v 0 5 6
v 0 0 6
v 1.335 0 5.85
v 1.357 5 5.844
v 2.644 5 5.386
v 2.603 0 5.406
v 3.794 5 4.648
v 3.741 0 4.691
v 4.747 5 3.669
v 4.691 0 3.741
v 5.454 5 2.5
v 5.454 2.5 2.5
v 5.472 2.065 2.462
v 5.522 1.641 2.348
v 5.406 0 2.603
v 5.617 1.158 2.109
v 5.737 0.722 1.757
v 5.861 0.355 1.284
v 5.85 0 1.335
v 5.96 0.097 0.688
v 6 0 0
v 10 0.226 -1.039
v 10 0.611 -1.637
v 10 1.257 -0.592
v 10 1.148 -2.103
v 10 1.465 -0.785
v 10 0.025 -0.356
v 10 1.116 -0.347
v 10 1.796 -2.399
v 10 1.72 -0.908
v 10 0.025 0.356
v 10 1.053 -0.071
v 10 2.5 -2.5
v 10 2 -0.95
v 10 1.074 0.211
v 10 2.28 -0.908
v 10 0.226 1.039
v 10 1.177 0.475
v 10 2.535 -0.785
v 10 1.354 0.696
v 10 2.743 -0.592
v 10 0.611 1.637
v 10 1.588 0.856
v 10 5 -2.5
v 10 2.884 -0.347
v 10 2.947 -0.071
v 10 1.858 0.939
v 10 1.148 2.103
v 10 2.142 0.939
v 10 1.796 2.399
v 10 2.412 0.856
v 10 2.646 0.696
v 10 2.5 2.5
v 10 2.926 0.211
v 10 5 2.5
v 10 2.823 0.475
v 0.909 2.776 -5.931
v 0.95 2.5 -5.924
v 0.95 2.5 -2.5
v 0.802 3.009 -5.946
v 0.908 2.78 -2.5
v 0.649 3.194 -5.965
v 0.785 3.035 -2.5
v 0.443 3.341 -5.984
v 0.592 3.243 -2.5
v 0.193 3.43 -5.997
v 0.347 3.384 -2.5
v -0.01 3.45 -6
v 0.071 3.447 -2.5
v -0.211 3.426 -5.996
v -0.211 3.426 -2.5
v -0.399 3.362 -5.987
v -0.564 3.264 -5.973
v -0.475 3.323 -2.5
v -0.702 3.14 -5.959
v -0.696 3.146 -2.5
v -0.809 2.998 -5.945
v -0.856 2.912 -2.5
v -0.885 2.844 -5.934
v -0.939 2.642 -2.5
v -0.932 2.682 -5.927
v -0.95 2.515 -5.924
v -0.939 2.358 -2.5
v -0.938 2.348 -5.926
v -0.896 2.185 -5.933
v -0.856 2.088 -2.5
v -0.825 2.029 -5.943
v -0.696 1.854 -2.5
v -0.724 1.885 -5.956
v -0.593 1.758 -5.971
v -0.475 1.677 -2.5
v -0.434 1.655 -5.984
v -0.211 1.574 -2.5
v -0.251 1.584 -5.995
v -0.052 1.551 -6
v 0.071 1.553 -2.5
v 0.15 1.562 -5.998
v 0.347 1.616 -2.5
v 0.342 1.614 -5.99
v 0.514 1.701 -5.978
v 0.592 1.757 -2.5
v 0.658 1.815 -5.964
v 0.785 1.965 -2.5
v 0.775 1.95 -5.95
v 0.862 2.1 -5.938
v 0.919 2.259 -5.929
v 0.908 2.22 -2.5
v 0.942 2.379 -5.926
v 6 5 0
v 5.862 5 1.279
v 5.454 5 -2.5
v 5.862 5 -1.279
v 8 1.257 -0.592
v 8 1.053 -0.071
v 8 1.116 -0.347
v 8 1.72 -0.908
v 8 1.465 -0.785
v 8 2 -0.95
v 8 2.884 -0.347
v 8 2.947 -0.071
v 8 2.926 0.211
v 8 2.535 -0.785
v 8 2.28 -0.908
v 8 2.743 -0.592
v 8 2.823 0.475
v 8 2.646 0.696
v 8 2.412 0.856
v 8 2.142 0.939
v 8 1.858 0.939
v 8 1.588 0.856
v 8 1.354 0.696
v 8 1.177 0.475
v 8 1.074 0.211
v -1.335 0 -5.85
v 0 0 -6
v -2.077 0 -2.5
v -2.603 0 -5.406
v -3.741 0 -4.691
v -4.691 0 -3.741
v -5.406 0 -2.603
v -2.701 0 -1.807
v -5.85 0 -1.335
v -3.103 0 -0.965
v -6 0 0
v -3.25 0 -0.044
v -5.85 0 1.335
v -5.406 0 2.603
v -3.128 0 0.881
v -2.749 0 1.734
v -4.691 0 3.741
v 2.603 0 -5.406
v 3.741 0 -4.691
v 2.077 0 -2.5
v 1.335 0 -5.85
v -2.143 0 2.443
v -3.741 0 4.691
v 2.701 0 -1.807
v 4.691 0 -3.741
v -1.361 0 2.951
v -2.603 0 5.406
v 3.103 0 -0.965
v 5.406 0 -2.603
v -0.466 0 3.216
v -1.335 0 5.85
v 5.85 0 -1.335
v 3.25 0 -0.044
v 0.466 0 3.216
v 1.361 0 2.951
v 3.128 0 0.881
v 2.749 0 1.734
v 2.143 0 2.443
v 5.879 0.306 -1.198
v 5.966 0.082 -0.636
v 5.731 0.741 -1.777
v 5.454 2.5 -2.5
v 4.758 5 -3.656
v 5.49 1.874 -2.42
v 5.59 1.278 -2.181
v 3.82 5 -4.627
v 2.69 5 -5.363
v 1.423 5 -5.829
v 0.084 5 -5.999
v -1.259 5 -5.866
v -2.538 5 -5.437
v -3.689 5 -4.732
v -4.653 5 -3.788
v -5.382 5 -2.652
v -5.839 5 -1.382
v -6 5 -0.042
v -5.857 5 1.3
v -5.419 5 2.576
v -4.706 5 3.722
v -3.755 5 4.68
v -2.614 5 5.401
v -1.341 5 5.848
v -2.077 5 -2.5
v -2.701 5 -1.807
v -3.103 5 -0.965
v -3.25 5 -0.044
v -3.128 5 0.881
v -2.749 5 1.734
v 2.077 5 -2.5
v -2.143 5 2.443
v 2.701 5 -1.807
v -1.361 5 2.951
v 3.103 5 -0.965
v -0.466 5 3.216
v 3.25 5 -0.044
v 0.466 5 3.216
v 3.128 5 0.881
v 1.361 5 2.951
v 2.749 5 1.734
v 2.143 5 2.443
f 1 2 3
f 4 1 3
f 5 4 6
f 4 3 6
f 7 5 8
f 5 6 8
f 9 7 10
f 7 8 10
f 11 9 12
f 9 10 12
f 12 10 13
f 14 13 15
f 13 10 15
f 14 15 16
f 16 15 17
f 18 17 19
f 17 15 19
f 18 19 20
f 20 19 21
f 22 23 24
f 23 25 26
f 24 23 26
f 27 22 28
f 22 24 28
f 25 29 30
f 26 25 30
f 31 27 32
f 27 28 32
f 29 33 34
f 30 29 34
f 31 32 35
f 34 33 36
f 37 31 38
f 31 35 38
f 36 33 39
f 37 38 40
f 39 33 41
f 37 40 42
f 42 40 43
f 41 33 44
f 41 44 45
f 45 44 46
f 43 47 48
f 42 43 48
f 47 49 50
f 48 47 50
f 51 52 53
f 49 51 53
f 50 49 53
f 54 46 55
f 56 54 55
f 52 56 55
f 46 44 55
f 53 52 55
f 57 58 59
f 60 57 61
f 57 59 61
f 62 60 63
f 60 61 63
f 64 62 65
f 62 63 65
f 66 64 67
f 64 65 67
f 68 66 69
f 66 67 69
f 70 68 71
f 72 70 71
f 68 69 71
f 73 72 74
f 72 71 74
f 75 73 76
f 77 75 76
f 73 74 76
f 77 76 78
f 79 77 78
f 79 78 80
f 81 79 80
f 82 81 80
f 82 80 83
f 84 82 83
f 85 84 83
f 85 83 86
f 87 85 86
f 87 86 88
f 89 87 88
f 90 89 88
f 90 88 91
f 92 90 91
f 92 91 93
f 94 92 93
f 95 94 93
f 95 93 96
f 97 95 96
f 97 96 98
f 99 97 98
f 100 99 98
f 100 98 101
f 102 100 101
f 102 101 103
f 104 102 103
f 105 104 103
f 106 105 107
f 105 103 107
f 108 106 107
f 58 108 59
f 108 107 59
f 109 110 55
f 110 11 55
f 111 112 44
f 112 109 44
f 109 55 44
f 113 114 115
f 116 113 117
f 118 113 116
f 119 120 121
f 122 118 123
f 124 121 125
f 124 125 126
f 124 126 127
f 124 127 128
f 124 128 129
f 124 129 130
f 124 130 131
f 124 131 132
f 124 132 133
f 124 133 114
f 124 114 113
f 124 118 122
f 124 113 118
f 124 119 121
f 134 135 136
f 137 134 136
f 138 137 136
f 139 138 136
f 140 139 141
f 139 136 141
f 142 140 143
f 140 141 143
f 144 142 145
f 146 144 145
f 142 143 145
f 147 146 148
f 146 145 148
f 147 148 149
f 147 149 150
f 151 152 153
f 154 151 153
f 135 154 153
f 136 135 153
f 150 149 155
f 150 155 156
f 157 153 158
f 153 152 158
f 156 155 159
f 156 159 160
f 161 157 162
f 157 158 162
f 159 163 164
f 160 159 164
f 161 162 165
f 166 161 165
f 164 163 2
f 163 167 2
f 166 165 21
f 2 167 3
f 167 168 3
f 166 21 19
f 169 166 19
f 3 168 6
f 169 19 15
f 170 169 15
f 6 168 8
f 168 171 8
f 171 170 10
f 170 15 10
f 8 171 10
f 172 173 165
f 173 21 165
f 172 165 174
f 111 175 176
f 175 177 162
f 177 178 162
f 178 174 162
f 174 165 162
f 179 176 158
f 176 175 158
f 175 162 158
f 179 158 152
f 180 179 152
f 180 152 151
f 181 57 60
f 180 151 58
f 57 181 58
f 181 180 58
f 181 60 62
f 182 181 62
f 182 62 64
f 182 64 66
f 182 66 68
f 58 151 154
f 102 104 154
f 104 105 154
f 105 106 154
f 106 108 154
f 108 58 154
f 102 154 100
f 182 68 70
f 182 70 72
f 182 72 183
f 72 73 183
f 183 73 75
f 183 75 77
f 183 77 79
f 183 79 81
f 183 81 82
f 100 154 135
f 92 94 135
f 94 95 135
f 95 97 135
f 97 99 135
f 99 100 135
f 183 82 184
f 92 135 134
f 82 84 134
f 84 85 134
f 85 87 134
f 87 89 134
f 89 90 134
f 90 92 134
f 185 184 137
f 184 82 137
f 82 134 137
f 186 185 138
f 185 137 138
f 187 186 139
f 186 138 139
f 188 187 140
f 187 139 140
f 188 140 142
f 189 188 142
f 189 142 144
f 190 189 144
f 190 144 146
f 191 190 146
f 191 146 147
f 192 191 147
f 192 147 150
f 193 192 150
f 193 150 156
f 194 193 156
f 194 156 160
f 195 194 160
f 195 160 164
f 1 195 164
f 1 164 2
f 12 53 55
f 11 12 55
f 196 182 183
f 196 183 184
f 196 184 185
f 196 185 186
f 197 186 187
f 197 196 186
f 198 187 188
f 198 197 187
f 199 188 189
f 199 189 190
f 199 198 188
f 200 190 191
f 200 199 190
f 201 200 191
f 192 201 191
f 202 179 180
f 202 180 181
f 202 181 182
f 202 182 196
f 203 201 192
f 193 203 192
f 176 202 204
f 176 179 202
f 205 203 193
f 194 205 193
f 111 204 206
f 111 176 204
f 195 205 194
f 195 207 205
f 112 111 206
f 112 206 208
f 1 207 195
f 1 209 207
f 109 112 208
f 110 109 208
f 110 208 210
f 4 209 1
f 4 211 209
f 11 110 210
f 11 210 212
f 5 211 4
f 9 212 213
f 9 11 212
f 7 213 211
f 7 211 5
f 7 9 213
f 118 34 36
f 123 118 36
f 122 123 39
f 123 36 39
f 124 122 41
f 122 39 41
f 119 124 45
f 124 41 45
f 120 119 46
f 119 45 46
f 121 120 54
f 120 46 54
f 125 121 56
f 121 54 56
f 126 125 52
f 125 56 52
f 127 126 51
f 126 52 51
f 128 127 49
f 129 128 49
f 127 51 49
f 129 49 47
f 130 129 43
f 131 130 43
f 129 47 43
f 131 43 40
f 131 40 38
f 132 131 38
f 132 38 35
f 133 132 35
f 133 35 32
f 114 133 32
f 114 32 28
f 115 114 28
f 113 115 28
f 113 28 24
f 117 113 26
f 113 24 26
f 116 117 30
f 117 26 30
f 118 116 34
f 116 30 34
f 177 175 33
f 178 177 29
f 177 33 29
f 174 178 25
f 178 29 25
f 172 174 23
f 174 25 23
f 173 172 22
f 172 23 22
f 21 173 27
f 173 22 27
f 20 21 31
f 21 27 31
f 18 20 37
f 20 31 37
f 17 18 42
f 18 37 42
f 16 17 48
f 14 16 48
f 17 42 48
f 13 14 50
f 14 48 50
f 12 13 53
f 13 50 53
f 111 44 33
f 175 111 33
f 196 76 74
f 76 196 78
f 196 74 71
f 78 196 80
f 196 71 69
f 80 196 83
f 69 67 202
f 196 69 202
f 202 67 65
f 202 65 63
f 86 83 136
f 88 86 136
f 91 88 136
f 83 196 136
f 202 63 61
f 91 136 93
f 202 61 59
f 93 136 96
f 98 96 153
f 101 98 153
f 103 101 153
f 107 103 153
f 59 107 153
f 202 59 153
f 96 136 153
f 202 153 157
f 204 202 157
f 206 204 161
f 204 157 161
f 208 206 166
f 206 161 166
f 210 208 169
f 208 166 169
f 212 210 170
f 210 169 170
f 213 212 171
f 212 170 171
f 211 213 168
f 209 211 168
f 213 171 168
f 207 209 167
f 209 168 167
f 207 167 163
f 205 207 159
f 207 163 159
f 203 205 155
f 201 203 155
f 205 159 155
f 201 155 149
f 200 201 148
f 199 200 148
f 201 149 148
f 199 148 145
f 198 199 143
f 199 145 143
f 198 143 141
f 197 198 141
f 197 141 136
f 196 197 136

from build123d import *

# Parameters (mm, degrees)
ESQUISSE1_R             = 6
BOSS_EXTRU_1_DEPTH      = 5
BOSS_EXTRU_2_REACH      = 21.849
BOSS_EXTRU_2_END_RADIUS = 6
BOSS_EXTRU_2_START      = 10
ESQUISSE4_R             = 0.95
ENL_V_MAT_EXTRU_1_DEPTH = 2
ESQUISSE5_R             = 0.95
ENL_V_MAT_EXTRU_2_DEPTH = 8


with BuildPart() as part:
    # Esquisse1 → Boss.-Extru.1 (new body)
    with BuildSketch(Plane(origin=(0, 0, 0), x_dir=(1, 0, 0), z_dir=(0, 1, 0))):
        Circle(ESQUISSE1_R)
        with BuildLine():
            Line((-2.076655966, 2.5), (2.076655966, 2.5))
            ThreePointArc((2.076655966, 2.5), (0, -3.25), (-2.076655966, 2.5))
        make_face(mode=Mode.SUBTRACT)
    extrude(amount=BOSS_EXTRU_1_DEPTH)

    # Boss.-Extru.2: up to this cylinder (the profile starts outside it)
    boss_extru_2_end = Plane(origin=(0, 2.733375, 0), z_dir=(0, -1, 0)) * Cylinder(BOSS_EXTRU_2_END_RADIUS, 56.698, mode=Mode.PRIVATE)
    # Esquisse3 → Boss.-Extru.2 (add, up to the surface)
    with BuildSketch(Plane(origin=(0, 0, 0), x_dir=(0, 0, -1), z_dir=(1, 0, 0)).offset(BOSS_EXTRU_2_START), mode=Mode.PRIVATE) as boss_extru_2_sk1:
        with BuildLine():
            Line((-2.5, 2.5), (-2.5, 5))
            Line((-2.5, 5), (2.5, 5))
            Line((2.5, 5), (2.5, 2.5))
            ThreePointArc((2.5, 2.5), (0, 0), (-2.5, 2.5))
        make_face()
    boss_extru_2_tool1 = extrude(boss_extru_2_sk1.sketch, amount=-BOSS_EXTRU_2_REACH, mode=Mode.PRIVATE) - boss_extru_2_end
    add(boss_extru_2_tool1.solids().sort_by_distance((10, 2.733375, 0))[0])

    # Esquisse4 → Enlèv. mat.-Extru.1 (cut)
    with BuildSketch(Plane(origin=(10, 0, 0), x_dir=(0, 0, -1), z_dir=(1, 0, 0))):
        with Locations((0, 2)):
            Circle(ESQUISSE4_R)
    extrude(amount=-ENL_V_MAT_EXTRU_1_DEPTH, mode=Mode.SUBTRACT)

    # Esquisse5 → Enlèv. mat.-Extru.2 (cut)
    with BuildSketch(Plane.XY):
        with Locations((0, 2.5)):
            Circle(ESQUISSE5_R)
    extrude(amount=-ENL_V_MAT_EXTRU_2_DEPTH, mode=Mode.SUBTRACT)


solid = part.part
